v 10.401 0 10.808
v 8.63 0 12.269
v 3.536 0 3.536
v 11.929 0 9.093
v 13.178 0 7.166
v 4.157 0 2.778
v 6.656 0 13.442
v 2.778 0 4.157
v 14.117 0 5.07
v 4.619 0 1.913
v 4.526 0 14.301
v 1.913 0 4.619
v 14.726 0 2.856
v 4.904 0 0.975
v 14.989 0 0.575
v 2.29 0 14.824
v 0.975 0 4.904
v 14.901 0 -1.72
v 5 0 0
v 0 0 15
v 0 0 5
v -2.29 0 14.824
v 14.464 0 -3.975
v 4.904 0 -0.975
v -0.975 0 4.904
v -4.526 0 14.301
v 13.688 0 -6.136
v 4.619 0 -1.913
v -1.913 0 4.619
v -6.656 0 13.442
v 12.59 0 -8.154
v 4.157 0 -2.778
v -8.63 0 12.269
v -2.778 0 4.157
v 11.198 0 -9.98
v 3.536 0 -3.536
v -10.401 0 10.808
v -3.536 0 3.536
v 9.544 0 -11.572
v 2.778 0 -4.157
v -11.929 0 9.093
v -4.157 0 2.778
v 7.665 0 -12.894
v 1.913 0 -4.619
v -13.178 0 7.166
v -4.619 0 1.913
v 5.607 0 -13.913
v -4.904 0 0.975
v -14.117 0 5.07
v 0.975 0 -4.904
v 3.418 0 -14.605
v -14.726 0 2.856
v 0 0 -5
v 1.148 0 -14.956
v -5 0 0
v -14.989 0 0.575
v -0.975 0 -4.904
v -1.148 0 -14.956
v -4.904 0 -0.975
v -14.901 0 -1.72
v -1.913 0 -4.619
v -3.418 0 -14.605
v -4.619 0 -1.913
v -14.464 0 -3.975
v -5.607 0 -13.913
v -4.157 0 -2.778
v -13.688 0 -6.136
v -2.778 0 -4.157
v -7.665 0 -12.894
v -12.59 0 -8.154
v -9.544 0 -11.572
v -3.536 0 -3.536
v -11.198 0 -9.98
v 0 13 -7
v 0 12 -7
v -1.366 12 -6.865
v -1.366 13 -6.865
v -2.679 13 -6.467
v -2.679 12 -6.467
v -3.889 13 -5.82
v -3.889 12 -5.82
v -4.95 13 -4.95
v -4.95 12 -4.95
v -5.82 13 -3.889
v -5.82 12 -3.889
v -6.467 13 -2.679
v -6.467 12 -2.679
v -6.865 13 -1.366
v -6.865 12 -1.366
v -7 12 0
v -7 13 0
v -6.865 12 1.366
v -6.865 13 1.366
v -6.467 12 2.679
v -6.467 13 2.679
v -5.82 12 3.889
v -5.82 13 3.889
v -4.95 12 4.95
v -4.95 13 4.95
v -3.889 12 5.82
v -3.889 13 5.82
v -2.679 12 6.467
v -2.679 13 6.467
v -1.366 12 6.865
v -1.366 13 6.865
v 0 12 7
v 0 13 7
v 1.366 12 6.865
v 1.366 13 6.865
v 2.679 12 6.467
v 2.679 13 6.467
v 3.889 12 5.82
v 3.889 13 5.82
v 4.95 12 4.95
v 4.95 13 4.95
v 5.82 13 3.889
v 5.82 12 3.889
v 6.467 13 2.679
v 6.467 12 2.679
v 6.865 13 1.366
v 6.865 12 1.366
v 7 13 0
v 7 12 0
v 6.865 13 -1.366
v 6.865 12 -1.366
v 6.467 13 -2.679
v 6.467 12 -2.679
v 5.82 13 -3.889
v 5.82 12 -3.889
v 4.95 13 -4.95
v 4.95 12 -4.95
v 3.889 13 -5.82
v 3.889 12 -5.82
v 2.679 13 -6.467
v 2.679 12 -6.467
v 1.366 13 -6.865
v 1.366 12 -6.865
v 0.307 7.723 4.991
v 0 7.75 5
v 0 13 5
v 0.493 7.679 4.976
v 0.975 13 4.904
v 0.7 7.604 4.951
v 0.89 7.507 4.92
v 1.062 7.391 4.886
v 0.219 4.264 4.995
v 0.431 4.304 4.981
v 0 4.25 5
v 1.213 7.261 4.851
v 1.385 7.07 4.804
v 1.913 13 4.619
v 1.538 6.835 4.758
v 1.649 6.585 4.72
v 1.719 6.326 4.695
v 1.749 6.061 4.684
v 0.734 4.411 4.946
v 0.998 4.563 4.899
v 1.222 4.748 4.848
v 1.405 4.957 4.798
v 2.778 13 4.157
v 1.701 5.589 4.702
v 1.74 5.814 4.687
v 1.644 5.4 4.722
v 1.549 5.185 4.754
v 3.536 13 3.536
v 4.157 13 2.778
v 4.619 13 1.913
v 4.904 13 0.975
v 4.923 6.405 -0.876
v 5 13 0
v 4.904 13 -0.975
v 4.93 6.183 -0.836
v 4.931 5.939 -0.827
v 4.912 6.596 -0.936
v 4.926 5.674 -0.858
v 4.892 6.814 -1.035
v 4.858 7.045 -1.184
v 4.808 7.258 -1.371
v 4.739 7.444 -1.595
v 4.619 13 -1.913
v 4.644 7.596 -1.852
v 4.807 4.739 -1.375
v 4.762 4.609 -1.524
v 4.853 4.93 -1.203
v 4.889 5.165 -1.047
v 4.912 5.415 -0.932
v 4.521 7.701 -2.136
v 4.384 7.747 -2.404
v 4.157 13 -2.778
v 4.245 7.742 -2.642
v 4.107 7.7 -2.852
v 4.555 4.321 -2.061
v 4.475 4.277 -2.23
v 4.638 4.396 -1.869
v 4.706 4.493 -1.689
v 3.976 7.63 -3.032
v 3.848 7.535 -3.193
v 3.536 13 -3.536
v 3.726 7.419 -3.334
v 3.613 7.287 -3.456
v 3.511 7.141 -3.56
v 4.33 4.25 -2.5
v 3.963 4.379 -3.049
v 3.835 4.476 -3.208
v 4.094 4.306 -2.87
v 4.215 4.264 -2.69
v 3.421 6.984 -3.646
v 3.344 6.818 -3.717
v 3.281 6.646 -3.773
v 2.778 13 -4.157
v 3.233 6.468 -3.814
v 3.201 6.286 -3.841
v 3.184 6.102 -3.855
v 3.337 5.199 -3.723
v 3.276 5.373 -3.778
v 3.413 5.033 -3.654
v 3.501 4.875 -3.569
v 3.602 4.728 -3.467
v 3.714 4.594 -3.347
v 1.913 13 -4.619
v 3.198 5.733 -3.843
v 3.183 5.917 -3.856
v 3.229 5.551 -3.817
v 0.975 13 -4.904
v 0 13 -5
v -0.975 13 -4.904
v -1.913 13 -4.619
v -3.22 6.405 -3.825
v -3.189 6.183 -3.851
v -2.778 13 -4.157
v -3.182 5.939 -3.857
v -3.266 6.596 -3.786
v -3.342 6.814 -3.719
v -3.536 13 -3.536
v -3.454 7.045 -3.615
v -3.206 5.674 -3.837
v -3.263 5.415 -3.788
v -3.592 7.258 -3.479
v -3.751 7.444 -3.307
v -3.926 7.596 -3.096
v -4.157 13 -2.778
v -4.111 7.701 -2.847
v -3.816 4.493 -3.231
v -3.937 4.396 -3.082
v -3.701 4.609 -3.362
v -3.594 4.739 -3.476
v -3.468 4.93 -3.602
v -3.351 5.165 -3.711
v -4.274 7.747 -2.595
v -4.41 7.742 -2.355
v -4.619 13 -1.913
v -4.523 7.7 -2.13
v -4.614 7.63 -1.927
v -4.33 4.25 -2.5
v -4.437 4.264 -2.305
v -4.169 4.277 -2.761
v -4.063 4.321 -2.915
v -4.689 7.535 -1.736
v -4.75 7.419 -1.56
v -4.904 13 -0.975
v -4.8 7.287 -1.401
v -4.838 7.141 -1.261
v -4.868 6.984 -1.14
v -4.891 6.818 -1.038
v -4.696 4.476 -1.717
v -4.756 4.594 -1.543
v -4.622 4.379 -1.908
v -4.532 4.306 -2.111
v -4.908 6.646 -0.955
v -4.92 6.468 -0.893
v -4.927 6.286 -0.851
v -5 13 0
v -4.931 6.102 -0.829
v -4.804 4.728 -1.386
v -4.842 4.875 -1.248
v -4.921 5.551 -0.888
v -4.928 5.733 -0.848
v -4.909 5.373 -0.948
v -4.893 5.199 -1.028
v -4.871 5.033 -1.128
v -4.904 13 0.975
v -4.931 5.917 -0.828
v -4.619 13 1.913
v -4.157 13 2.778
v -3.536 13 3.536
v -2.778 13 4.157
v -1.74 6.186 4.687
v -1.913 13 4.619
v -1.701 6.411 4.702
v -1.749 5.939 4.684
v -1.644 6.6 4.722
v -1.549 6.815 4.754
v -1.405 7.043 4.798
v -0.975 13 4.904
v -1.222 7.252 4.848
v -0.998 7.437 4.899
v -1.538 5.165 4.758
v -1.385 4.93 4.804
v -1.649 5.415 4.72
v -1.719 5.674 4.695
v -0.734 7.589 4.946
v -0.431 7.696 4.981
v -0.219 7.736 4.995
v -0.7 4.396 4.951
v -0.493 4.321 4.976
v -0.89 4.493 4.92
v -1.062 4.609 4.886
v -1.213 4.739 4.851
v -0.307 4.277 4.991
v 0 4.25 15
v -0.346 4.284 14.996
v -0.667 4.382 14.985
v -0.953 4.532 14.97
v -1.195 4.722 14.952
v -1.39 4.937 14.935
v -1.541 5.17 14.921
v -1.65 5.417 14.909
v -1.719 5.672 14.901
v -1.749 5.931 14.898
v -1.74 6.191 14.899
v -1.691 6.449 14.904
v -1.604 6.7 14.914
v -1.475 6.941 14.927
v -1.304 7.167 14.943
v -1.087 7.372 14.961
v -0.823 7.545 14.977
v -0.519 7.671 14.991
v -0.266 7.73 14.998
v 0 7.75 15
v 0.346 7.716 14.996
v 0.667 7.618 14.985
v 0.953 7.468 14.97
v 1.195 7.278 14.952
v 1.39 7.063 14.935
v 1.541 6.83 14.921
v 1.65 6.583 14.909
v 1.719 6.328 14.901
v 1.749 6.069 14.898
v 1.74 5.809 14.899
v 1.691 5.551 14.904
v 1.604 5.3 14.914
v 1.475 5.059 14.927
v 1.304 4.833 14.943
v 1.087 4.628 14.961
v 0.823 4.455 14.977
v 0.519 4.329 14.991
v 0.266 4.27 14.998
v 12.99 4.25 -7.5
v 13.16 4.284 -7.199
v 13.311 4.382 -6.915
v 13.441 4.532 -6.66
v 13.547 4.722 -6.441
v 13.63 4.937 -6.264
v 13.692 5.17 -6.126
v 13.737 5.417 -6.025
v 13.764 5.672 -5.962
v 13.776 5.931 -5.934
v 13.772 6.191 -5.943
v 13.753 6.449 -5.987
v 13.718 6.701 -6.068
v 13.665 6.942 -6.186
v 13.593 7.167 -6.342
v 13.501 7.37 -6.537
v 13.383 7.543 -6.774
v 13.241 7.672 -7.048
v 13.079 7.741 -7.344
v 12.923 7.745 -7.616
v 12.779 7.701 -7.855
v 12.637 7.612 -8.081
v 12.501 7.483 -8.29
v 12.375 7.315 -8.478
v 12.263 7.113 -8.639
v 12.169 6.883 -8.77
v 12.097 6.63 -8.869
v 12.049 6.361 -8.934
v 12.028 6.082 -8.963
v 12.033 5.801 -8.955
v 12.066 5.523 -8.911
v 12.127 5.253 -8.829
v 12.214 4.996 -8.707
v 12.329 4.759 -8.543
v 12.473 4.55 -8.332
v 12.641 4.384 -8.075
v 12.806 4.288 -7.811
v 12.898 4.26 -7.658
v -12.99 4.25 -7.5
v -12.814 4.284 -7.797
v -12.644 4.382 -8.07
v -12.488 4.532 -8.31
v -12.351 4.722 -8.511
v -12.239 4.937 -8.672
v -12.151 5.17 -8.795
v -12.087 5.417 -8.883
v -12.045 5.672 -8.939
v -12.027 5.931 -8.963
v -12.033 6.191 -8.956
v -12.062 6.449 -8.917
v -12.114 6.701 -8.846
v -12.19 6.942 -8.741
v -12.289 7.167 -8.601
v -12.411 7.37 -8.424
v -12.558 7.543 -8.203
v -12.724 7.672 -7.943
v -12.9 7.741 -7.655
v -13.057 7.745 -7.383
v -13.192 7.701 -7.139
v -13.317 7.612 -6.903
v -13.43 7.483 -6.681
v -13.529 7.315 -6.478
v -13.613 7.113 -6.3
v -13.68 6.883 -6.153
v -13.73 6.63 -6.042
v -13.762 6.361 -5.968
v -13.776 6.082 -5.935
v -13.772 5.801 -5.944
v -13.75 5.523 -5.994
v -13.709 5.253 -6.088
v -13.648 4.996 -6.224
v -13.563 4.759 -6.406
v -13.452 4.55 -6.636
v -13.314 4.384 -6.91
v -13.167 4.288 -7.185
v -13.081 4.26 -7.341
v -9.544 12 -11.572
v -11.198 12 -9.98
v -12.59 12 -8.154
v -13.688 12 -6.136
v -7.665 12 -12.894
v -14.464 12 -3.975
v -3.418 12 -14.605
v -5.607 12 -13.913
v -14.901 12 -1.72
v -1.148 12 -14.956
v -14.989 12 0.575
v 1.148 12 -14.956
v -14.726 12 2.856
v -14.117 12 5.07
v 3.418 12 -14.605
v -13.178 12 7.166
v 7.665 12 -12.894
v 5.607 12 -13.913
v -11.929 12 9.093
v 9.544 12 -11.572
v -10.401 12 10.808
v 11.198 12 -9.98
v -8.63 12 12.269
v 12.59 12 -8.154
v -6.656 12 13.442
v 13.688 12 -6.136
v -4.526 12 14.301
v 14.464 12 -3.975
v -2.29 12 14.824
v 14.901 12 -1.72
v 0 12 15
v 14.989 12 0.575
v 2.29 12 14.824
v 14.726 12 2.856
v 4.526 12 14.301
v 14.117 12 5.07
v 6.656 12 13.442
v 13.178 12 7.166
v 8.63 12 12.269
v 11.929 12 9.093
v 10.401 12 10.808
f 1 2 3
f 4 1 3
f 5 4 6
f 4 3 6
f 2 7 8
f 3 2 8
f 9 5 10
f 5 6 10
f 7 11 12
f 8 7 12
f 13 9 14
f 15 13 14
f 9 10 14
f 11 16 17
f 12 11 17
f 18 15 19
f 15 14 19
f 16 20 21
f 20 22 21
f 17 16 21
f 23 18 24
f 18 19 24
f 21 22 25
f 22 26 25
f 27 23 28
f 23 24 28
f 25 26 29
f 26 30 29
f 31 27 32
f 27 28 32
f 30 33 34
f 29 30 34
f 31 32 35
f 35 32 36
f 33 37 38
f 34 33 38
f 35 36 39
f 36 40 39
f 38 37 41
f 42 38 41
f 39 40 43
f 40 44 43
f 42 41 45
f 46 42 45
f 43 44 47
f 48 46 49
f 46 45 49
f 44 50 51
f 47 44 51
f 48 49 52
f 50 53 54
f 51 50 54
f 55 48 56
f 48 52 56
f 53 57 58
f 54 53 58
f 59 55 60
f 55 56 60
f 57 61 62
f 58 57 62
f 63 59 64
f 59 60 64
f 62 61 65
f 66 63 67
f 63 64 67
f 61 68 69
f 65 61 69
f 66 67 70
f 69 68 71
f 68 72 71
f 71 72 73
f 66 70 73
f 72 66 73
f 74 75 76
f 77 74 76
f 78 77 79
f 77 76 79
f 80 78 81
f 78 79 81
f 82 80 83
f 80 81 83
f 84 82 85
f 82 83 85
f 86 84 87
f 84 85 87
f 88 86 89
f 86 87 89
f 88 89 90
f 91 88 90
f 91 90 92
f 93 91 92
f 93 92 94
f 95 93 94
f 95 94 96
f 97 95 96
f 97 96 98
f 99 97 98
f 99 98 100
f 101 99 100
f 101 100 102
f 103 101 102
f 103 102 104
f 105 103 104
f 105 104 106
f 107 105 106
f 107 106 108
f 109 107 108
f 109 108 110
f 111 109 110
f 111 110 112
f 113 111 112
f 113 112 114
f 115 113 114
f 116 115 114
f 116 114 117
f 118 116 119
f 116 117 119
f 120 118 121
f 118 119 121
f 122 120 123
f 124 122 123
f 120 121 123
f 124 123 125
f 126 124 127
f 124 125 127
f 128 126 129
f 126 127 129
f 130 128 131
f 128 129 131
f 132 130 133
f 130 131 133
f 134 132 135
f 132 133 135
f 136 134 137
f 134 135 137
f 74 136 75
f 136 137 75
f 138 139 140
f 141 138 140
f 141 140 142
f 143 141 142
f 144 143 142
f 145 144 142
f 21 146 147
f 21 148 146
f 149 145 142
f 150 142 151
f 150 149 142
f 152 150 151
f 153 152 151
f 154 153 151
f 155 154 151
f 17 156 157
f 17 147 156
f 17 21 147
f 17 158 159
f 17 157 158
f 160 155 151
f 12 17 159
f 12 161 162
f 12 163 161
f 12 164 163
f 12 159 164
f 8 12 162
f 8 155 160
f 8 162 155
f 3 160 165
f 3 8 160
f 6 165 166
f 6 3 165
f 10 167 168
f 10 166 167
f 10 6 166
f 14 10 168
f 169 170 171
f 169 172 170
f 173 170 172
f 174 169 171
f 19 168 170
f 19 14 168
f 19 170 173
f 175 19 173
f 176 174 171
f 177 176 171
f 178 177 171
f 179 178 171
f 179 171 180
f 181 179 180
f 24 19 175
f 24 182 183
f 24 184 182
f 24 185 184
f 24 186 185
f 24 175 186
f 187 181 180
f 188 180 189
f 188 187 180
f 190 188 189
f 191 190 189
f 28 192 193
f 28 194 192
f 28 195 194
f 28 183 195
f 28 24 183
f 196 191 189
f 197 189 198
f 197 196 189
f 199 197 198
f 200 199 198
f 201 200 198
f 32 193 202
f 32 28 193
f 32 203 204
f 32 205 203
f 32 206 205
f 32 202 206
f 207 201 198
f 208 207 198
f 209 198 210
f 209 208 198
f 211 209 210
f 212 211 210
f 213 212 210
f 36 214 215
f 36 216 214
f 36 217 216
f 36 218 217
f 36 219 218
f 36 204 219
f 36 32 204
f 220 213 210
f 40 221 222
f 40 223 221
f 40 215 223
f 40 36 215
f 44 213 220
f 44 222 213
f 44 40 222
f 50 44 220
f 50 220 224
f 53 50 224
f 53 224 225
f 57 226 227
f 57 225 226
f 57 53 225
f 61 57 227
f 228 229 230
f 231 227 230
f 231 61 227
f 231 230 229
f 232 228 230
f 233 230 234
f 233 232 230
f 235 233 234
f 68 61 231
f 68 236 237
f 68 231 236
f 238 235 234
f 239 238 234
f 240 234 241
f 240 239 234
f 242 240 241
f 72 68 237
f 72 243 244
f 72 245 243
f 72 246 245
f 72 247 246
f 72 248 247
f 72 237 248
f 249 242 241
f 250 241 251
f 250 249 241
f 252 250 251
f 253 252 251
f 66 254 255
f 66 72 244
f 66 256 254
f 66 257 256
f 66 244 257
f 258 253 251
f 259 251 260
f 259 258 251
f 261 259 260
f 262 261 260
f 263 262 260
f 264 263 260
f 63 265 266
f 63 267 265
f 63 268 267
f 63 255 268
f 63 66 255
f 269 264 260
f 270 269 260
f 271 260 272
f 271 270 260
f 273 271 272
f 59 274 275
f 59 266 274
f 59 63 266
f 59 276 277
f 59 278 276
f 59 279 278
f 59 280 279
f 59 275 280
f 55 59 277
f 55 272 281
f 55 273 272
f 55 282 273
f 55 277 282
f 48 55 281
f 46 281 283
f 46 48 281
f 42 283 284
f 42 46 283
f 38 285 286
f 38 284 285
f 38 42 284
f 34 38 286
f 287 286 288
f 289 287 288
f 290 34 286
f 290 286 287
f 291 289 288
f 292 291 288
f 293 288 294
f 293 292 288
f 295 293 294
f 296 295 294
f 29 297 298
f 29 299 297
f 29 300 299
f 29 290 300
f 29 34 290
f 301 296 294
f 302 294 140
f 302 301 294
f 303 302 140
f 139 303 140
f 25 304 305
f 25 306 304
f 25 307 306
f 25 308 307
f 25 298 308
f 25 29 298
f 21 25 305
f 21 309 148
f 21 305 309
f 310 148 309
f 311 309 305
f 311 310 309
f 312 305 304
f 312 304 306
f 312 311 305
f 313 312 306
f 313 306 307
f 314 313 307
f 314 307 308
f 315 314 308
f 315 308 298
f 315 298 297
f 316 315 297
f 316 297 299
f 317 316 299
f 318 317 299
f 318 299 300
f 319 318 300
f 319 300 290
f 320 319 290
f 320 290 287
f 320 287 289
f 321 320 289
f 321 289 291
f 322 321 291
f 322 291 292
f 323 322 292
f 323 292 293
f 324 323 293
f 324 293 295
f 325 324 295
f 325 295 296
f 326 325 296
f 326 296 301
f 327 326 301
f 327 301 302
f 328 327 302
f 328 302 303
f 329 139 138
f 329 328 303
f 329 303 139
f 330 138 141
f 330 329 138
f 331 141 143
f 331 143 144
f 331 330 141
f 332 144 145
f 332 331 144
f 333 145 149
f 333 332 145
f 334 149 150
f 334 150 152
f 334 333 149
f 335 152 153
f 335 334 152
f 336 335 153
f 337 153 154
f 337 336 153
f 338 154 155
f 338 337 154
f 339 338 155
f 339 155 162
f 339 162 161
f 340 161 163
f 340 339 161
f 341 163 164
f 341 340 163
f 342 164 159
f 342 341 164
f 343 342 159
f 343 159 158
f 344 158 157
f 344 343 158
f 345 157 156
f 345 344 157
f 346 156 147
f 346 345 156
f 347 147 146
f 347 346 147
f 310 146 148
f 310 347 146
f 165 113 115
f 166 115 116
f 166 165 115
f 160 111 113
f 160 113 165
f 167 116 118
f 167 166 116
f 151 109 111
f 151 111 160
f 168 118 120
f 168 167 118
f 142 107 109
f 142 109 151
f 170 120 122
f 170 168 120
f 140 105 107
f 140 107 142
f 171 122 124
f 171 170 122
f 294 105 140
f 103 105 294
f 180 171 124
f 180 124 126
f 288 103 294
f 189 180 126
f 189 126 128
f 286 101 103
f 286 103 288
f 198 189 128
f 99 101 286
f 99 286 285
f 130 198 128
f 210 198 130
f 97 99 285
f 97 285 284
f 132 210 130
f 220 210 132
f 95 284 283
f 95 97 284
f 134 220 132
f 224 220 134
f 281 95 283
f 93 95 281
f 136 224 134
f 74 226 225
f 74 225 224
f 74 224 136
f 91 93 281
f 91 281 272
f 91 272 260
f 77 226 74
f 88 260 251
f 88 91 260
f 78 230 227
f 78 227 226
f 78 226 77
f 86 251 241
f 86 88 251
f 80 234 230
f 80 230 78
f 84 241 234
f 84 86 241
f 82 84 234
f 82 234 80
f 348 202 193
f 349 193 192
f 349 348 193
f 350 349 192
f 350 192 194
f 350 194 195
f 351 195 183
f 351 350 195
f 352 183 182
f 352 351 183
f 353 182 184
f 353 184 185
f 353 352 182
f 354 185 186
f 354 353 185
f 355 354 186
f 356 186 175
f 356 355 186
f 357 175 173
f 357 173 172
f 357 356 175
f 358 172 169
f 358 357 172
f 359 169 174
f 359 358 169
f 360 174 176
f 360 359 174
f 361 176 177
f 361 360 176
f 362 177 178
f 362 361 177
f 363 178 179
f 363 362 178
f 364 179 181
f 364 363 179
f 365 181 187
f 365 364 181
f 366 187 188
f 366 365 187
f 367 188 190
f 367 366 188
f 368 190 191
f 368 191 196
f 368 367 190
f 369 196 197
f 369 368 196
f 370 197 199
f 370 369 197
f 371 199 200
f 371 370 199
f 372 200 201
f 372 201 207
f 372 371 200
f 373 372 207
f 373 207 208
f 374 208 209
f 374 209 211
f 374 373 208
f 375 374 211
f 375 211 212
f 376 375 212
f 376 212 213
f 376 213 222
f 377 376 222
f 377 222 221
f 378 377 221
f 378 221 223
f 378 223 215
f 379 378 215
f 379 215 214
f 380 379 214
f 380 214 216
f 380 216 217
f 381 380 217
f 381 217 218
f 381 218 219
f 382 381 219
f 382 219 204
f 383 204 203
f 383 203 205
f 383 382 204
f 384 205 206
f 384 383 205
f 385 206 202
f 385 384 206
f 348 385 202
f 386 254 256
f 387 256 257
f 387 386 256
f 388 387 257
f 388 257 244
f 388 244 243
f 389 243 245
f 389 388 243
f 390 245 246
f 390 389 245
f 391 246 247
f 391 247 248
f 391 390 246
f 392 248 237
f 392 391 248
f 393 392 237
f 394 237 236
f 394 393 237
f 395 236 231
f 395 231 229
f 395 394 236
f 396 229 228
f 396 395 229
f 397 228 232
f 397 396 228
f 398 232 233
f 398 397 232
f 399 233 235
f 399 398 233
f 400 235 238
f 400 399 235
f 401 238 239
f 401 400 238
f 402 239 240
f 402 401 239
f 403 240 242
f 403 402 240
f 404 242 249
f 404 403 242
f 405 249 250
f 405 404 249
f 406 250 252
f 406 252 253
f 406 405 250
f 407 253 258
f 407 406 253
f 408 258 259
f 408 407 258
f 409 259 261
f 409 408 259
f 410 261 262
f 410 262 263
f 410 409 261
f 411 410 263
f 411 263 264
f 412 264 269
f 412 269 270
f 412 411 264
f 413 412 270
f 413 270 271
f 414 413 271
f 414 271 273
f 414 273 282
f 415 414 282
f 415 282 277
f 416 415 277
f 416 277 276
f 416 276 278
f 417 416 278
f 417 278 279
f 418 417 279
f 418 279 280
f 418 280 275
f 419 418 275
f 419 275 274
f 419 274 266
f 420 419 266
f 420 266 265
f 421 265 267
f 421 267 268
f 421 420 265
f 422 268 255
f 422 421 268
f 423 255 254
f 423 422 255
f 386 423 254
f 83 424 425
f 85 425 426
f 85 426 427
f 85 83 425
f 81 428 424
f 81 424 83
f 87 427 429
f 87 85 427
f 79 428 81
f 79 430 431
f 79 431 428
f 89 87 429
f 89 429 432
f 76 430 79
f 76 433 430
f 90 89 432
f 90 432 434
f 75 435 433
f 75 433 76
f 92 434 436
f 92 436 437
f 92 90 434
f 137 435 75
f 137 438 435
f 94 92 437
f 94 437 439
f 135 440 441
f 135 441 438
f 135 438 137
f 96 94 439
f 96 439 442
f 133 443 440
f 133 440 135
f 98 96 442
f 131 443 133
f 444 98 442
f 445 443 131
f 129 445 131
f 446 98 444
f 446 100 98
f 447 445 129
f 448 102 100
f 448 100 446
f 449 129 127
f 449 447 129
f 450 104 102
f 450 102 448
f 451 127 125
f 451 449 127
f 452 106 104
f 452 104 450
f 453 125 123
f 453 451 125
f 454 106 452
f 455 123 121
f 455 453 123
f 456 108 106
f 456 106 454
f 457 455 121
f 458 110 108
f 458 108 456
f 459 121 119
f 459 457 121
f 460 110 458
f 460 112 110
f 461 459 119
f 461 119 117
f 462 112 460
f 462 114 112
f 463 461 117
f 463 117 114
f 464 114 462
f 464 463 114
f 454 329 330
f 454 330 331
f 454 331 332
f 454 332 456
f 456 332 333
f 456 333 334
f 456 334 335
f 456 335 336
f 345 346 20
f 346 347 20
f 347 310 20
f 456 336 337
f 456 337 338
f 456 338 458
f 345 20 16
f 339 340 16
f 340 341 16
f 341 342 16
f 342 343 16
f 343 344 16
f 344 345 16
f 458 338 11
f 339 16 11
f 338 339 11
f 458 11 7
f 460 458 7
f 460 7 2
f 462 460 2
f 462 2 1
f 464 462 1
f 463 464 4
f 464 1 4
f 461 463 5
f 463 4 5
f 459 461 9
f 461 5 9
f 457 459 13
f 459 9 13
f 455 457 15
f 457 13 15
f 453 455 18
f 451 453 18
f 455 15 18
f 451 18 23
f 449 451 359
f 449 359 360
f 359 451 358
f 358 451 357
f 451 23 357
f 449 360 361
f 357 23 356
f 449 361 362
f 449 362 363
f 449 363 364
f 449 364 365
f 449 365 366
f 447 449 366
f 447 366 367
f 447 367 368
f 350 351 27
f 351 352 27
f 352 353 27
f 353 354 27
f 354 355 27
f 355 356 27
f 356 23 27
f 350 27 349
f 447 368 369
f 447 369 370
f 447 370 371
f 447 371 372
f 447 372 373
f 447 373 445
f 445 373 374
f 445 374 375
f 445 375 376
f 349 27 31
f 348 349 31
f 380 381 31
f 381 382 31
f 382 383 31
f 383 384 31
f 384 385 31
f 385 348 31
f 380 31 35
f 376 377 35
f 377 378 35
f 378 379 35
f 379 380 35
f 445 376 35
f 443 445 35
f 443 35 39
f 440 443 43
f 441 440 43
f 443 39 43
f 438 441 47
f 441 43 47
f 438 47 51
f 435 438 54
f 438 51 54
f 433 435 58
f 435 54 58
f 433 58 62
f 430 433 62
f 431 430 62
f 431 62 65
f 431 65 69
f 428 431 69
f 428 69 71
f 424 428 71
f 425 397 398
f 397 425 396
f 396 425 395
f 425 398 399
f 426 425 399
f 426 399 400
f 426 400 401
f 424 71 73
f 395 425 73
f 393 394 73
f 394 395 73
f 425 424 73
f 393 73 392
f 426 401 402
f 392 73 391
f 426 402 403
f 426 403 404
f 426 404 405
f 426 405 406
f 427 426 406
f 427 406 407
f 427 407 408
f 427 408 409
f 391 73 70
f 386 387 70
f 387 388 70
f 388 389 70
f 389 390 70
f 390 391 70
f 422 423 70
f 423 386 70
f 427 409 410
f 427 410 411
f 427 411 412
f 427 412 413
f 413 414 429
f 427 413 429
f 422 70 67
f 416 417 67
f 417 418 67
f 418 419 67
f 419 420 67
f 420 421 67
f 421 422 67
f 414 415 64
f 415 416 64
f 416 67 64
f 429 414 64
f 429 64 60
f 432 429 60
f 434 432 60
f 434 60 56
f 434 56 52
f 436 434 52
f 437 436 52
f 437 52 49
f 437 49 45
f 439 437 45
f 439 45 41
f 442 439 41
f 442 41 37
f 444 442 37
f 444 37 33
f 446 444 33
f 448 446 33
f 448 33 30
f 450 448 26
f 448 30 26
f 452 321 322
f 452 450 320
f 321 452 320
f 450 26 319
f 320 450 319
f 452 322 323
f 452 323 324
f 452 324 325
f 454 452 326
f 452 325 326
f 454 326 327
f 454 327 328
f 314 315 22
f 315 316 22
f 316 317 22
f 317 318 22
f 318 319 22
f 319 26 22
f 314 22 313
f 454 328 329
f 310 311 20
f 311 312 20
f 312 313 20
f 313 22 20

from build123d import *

# Parameters (mm, degrees)
SKETCH1_R               = 15
BOSS_EXTRUDE1_DEPTH     = 12
SKETCH13_R              = 7
BOSS_EXTRUDE3_DEPTH     = 13
CUT_EXTRUDE2_DEPTH      = 25.372115214
CUT_EXTRUDE2_DEPTH_BACK = 25.372115214
SKETCH2_R               = 5
CIRPATTERN1_COUNT       = 3


with BuildPart() as part:
    # Sketch1 → Boss-Extrude1 (new body)
    with BuildSketch(Plane(origin=(0, 0, 0), x_dir=(1, 0, 0), z_dir=(0, 1, 0))):
        with Locations(Location((0, 0, 0), (0, 0, 270))):
            Circle(SKETCH1_R)
    extrude(amount=BOSS_EXTRUDE1_DEPTH)

    # Sketch13 → Boss-Extrude3 (add)
    with BuildSketch(Plane(origin=(0, 0, 0), x_dir=(1, 0, 0), z_dir=(0, 1, 0))):
        with Locations(Location((0, 0, 0), (0, 0, 90))):
            Circle(SKETCH13_R)
    extrude(amount=BOSS_EXTRUDE3_DEPTH)

    # Sketch2 → Cut-Extrude2 (cut, two sides: drawn at the far end of the back side and taken through both)
    with BuildSketch(Plane(origin=(0, 12, 0), x_dir=(1, 0, 0), z_dir=(0, 1, 0)).offset(-CUT_EXTRUDE2_DEPTH_BACK)):
        with Locations(Location((0, 0, 0), (0, 0, 270))):
            Circle(SKETCH2_R)
    extrude(amount=CUT_EXTRUDE2_DEPTH + CUT_EXTRUDE2_DEPTH_BACK, mode=Mode.SUBTRACT)

    # Sketch16 → Ø4.0mm Dowel Hole1 (revolve, cut)
    with BuildSketch(Plane(origin=(0, 6, 15), x_dir=(0, -1, 0), z_dir=(1, 0, 0))):
        Polygon((0, 0), (0, 16.050506083), (1.75, 14.999), (1.75, 0), align=None)
    f_4_0mm_dowel_hole1 = revolve(axis=Axis((0, 6, 21.35), (0, 0, -1)), mode=Mode.SUBTRACT)

    # CirPattern1: Ø4.0mm Dowel Hole1 ×3 about axis
    cirpattern1_axis = Axis((0, 0, 0), (0, 1, 0))
    for i in range(1, CIRPATTERN1_COUNT):
        add(f_4_0mm_dowel_hole1.rotate(cirpattern1_axis, i * 360 / CIRPATTERN1_COUNT), mode=Mode.SUBTRACT)


solid = part.part
